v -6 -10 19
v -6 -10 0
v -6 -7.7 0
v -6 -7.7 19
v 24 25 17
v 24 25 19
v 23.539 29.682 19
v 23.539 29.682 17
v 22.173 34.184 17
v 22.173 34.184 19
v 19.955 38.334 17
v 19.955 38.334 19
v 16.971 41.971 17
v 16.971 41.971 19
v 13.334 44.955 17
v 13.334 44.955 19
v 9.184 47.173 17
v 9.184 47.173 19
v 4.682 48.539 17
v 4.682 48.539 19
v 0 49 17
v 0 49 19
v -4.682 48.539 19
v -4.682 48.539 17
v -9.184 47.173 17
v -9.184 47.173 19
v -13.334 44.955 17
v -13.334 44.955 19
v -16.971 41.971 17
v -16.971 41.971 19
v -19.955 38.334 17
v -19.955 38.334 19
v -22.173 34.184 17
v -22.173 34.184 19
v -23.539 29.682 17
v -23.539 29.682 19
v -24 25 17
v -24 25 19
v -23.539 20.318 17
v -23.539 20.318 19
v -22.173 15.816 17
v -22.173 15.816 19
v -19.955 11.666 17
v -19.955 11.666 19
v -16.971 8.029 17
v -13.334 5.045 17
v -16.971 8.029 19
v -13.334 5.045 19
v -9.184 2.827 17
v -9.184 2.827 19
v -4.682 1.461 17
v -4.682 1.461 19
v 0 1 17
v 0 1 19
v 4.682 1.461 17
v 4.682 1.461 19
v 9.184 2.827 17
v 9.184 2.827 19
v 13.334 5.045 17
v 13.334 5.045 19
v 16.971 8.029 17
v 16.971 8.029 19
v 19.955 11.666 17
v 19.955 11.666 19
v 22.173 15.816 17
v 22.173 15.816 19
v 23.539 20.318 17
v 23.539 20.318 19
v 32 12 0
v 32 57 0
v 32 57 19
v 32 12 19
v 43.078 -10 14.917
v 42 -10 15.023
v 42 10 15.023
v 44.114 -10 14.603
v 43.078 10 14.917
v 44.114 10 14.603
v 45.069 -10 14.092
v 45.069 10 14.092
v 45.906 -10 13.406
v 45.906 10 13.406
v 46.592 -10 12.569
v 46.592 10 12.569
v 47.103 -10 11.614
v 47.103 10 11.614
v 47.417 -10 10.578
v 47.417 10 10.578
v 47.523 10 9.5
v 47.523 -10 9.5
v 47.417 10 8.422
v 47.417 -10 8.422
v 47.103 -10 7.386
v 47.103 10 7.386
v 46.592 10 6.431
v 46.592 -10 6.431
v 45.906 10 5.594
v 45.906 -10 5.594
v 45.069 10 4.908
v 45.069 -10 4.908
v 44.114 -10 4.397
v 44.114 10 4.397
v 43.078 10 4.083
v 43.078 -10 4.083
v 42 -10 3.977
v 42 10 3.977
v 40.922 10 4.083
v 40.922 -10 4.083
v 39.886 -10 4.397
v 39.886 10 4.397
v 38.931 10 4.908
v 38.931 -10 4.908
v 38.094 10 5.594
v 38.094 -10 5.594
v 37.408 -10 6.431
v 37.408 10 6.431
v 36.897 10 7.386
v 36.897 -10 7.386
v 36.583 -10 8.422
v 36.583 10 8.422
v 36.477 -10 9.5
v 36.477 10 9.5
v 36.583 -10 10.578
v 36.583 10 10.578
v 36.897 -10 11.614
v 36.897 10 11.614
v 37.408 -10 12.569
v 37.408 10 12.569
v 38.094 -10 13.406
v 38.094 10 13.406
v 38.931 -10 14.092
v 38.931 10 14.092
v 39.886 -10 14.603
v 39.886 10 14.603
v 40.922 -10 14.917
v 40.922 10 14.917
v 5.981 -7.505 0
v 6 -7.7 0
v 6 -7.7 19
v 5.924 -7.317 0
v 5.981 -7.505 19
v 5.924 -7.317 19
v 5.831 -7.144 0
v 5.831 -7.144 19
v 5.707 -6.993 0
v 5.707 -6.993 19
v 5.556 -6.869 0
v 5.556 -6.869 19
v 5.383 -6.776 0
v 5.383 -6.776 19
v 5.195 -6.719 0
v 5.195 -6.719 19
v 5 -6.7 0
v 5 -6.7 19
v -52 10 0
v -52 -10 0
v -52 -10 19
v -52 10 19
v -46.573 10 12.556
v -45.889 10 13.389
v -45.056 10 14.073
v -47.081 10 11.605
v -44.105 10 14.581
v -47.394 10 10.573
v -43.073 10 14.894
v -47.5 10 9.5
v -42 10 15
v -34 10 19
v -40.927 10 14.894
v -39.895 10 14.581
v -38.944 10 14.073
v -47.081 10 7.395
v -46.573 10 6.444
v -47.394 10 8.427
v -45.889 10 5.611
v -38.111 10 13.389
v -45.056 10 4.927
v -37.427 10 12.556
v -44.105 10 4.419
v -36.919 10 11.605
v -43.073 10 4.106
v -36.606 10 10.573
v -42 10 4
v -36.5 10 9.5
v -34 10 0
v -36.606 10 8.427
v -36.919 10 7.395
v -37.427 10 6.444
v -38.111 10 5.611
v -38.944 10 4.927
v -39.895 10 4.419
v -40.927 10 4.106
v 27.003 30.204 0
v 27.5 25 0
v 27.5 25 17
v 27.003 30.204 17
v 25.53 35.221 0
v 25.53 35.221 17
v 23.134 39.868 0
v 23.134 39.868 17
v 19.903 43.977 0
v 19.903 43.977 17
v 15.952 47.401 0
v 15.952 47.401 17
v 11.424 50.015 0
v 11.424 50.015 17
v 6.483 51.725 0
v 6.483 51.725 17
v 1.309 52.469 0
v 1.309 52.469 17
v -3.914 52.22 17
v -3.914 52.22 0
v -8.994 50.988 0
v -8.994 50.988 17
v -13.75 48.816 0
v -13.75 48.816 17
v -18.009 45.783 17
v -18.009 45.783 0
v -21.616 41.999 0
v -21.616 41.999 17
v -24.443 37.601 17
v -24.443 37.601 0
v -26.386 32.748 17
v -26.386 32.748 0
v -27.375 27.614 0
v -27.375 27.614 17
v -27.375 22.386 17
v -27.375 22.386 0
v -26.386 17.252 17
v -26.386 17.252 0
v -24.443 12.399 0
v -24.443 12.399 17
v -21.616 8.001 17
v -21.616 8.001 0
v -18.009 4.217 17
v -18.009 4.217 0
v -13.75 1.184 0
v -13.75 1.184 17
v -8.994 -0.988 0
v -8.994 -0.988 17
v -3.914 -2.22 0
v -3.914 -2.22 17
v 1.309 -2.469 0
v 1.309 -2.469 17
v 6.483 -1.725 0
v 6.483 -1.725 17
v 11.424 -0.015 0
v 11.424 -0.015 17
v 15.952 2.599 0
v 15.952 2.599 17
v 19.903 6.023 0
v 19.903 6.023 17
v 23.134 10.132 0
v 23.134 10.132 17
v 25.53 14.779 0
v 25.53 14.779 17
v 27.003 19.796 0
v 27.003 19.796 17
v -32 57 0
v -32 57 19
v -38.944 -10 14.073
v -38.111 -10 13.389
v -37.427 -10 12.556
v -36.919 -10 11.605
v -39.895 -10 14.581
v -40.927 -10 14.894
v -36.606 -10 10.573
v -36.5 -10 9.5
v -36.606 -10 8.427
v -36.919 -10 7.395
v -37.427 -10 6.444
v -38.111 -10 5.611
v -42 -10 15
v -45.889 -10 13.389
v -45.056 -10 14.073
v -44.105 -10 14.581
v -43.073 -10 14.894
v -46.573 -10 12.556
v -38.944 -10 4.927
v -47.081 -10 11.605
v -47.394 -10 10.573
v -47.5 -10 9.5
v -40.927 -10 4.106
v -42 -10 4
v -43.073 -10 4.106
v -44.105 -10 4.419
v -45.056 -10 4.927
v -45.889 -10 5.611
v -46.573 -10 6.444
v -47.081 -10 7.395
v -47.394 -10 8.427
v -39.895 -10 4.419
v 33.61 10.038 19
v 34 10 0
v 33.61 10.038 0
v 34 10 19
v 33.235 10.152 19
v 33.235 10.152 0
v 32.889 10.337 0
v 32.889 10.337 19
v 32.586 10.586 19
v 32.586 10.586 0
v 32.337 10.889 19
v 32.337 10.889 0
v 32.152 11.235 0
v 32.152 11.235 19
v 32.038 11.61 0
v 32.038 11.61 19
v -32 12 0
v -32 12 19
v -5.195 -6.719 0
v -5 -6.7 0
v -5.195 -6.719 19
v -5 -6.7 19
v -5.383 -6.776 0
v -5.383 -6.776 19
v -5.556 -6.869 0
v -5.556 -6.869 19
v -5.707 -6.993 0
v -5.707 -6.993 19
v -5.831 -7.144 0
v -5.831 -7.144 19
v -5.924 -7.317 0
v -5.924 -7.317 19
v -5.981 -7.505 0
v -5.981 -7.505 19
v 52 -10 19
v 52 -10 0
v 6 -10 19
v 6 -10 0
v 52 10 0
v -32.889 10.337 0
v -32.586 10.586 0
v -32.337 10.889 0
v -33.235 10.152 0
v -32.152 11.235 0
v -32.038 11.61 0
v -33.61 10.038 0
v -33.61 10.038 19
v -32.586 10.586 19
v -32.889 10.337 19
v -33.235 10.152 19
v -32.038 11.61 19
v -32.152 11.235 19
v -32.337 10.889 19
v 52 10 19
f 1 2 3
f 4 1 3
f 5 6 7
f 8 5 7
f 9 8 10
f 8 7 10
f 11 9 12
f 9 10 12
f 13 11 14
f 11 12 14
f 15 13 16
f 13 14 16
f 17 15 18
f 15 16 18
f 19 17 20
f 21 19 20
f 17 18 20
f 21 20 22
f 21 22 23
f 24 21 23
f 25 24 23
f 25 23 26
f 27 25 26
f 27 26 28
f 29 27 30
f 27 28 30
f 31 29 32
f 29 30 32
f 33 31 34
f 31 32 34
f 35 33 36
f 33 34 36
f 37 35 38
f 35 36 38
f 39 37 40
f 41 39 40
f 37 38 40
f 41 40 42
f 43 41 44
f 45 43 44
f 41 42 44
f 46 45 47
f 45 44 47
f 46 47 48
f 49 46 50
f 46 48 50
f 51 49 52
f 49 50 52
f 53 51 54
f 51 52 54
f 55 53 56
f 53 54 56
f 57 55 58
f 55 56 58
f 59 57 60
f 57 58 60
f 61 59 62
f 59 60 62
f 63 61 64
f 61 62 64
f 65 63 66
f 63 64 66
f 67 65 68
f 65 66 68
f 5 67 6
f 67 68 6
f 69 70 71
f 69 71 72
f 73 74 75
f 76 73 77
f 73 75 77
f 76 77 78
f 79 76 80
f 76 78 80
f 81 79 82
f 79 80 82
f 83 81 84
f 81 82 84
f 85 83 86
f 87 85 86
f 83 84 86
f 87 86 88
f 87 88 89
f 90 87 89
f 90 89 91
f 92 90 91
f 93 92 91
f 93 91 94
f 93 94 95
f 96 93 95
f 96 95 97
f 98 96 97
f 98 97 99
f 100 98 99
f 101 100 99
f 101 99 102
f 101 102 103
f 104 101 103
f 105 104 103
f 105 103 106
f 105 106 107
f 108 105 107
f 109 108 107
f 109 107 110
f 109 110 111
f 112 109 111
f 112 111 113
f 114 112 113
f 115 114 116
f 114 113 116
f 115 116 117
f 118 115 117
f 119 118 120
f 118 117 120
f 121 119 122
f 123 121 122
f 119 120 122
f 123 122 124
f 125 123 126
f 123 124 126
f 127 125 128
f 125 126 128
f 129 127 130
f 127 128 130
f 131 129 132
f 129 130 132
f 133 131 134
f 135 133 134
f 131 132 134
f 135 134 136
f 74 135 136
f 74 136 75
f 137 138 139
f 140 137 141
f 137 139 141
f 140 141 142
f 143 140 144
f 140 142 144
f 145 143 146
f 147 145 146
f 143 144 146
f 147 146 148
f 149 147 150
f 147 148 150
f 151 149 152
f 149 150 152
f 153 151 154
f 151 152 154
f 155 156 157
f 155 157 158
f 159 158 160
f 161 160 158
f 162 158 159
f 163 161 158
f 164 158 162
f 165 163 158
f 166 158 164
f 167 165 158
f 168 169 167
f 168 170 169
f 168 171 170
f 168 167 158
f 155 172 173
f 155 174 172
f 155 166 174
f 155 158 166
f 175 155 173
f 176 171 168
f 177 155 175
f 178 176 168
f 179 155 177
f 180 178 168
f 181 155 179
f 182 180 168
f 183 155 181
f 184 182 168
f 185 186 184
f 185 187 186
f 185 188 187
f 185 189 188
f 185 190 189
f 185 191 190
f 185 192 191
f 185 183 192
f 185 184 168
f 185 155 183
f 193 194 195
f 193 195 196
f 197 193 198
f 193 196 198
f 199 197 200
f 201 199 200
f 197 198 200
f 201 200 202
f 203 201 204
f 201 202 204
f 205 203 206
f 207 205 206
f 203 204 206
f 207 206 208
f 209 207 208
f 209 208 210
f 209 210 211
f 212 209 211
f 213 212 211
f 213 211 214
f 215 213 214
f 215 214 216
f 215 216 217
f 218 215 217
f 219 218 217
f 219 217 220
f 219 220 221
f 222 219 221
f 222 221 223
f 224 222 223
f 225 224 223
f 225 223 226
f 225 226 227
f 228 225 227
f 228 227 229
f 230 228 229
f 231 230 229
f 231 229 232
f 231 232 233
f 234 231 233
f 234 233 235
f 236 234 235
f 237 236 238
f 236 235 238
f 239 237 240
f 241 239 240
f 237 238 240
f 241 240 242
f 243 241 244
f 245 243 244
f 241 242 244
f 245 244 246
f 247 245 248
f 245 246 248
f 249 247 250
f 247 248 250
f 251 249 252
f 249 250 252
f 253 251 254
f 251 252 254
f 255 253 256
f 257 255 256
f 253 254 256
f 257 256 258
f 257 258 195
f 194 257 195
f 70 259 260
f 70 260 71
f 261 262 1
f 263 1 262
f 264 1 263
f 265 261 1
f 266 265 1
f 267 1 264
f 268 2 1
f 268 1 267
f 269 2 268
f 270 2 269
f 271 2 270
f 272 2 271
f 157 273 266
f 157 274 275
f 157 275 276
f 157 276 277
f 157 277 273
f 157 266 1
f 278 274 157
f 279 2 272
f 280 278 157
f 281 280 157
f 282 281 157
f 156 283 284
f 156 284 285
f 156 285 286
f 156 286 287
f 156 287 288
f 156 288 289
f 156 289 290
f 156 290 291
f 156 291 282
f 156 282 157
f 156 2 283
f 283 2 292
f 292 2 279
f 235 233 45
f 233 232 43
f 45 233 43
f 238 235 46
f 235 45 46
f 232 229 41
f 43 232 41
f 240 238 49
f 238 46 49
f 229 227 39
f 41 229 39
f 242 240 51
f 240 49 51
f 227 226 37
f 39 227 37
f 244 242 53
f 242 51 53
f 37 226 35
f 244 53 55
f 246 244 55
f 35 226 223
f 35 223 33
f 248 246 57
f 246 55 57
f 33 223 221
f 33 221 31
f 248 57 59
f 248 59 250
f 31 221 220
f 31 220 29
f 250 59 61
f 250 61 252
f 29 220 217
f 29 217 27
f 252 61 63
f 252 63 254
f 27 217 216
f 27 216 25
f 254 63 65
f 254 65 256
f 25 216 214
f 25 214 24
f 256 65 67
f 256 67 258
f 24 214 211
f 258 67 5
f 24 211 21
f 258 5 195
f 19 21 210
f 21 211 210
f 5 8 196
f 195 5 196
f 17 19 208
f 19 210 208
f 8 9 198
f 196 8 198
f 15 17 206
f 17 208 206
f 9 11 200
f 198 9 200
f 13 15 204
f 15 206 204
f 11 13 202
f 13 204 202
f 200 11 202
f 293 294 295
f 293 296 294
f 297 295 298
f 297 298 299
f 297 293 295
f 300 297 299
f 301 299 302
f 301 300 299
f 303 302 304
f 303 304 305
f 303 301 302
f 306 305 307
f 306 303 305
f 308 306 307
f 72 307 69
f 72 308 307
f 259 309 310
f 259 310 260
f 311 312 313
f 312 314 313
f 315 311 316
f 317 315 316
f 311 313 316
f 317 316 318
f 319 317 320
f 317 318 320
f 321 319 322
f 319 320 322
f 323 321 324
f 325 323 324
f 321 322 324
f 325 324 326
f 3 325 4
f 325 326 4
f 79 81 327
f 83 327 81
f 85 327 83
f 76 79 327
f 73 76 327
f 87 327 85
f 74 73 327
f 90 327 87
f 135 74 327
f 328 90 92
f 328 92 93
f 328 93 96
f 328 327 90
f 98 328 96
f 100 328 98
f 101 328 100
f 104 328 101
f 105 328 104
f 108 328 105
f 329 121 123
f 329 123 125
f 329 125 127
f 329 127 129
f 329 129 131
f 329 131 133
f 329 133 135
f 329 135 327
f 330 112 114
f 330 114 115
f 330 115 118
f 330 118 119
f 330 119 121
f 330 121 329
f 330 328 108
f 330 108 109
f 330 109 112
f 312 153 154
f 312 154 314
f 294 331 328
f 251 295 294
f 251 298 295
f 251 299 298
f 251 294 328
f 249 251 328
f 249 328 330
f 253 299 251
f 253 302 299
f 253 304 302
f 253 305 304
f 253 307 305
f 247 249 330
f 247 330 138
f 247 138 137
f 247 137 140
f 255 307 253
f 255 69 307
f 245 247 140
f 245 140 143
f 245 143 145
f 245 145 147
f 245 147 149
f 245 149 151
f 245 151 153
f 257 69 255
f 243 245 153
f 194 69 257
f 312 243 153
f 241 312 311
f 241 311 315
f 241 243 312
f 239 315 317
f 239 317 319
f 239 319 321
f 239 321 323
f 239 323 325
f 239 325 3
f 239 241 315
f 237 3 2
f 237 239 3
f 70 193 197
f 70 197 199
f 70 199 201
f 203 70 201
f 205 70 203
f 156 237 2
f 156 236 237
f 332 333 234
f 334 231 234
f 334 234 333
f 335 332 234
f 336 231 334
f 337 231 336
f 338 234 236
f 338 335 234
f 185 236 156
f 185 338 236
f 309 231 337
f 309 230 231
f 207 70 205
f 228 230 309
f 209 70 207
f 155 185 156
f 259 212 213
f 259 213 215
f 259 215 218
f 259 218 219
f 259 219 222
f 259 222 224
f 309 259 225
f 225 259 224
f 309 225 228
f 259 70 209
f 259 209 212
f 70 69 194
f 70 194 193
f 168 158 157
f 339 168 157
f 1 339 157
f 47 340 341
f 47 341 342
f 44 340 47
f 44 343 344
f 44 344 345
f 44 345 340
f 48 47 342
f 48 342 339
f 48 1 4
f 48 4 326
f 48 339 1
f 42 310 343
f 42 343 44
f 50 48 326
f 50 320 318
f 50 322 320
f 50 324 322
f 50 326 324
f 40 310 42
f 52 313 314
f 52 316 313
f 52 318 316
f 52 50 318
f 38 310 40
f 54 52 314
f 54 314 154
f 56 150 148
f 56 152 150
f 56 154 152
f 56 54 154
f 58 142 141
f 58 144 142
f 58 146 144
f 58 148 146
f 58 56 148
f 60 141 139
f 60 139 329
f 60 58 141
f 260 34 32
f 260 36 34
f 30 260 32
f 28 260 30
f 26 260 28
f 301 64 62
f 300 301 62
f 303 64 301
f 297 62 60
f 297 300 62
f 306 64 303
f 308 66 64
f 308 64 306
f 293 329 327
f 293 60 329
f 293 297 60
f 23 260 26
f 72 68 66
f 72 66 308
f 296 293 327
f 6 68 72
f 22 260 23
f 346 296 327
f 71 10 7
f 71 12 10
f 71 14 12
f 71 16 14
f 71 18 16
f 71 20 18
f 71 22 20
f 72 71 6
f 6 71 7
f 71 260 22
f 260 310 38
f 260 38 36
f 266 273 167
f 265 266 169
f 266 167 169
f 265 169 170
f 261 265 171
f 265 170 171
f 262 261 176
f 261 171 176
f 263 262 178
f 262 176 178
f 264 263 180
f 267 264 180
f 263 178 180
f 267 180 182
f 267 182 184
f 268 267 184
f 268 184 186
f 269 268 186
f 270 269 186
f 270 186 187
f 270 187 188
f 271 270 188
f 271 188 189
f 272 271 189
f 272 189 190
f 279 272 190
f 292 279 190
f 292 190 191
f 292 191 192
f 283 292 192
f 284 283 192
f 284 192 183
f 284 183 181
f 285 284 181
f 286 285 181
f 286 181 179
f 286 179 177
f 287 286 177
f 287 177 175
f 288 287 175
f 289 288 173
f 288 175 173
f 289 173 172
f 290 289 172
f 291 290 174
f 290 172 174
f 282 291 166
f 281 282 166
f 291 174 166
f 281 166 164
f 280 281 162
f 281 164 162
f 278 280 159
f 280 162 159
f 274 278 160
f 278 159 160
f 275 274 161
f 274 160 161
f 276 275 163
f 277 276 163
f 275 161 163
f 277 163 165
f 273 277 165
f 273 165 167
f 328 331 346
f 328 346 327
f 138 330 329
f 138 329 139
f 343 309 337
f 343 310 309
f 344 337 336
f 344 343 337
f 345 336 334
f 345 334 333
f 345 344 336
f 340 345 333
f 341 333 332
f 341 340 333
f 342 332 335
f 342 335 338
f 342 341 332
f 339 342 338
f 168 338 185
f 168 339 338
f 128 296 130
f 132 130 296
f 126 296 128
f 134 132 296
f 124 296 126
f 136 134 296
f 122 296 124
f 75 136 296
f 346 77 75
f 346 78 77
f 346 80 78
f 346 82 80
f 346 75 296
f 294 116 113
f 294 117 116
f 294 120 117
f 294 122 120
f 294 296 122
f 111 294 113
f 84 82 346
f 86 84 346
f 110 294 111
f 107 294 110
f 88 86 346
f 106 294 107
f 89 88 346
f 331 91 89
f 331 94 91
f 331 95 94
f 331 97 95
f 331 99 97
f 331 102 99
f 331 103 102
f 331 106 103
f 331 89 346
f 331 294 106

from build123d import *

# Parameters (mm, degrees)
EXTRUDE_1_DEPTH     = 19
SKETCH_3_R          = 27.5
CUT_EXTRUDE_1_DEPTH = 19
SKETCH_4_R          = 5.5
SKETCH_4_R_2        = 5.523267564
CUT_EXTRUDE_2_DEPTH = 30
SKETCH_5_R          = 27.5
SKETCH_5_R_2        = 24
EXTRUDE_2_DEPTH     = 2
SKETCH_6_W          = 12
SKETCH_6_H          = 6.6
CUT_EXTRUDE_3_DEPTH = 30
FILLET_1_R          = 1
FILLET_2_R          = 2


with BuildPart() as part:
    # 草图2 → 凸台-拉伸1 (new body)
    with BuildSketch(Plane.XY):
        Polygon((32, 10), (52, 10), (52, -10), (-52, -10), (-52, 10), (-32, 10), (-32, 57), (32, 57), align=None)
    extrude(amount=EXTRUDE_1_DEPTH)

    # 草图3 → 切除-拉伸1 (cut)
    with BuildSketch(Plane.XY.offset(19)):
        with Locations((0, 25)):
            Circle(SKETCH_3_R)
    extrude(amount=-CUT_EXTRUDE_1_DEPTH, mode=Mode.SUBTRACT)

    # 草图4 → 切除-拉伸2 (cut)
    with BuildSketch(Plane(origin=(0, 10, 0), x_dir=(1, 0, 0), z_dir=(0, 1, 0))):
        with Locations(Location((-42, -9.5, 0), (0, 0, 270))):
            Circle(SKETCH_4_R)
        with Locations(Location((42, -9.5, 0), (0, 0, 270))):
            Circle(SKETCH_4_R_2)
    extrude(amount=-CUT_EXTRUDE_2_DEPTH, mode=Mode.SUBTRACT)

    # 草图5 → 凸台-拉伸2 (add)
    with BuildSketch(Plane.XY.offset(19)):
        with Locations((0, 25)):
            Circle(SKETCH_5_R)
        with Locations((0, 25)):
            Circle(SKETCH_5_R_2, mode=Mode.SUBTRACT)
    extrude(amount=-EXTRUDE_2_DEPTH)

    # 草图6 → 切除-拉伸3 (cut)
    with BuildSketch(Plane(origin=(0, 0, 0), x_dir=(-1, 0, 0), z_dir=(0, 0, -1))):
        with Locations((0, -10)):
            Rectangle(SKETCH_6_W, SKETCH_6_H)
    extrude(amount=-CUT_EXTRUDE_3_DEPTH, mode=Mode.SUBTRACT)

    # 圆角1
    fillet_1_edges = [part.edges().sort_by_distance(p)[0] for p in [
        (-6, -6.7, 9.5),
        (6, -6.7, 9.5),
    ]]
    fillet(fillet_1_edges, radius=FILLET_1_R)

    # 圆角2
    fillet_2_edges = [part.edges().sort_by_distance(p)[0] for p in [
        (-32, 10, 9.5),
        (32, 10, 9.5),
    ]]
    fillet(fillet_2_edges, radius=FILLET_2_R)


solid = part.part
